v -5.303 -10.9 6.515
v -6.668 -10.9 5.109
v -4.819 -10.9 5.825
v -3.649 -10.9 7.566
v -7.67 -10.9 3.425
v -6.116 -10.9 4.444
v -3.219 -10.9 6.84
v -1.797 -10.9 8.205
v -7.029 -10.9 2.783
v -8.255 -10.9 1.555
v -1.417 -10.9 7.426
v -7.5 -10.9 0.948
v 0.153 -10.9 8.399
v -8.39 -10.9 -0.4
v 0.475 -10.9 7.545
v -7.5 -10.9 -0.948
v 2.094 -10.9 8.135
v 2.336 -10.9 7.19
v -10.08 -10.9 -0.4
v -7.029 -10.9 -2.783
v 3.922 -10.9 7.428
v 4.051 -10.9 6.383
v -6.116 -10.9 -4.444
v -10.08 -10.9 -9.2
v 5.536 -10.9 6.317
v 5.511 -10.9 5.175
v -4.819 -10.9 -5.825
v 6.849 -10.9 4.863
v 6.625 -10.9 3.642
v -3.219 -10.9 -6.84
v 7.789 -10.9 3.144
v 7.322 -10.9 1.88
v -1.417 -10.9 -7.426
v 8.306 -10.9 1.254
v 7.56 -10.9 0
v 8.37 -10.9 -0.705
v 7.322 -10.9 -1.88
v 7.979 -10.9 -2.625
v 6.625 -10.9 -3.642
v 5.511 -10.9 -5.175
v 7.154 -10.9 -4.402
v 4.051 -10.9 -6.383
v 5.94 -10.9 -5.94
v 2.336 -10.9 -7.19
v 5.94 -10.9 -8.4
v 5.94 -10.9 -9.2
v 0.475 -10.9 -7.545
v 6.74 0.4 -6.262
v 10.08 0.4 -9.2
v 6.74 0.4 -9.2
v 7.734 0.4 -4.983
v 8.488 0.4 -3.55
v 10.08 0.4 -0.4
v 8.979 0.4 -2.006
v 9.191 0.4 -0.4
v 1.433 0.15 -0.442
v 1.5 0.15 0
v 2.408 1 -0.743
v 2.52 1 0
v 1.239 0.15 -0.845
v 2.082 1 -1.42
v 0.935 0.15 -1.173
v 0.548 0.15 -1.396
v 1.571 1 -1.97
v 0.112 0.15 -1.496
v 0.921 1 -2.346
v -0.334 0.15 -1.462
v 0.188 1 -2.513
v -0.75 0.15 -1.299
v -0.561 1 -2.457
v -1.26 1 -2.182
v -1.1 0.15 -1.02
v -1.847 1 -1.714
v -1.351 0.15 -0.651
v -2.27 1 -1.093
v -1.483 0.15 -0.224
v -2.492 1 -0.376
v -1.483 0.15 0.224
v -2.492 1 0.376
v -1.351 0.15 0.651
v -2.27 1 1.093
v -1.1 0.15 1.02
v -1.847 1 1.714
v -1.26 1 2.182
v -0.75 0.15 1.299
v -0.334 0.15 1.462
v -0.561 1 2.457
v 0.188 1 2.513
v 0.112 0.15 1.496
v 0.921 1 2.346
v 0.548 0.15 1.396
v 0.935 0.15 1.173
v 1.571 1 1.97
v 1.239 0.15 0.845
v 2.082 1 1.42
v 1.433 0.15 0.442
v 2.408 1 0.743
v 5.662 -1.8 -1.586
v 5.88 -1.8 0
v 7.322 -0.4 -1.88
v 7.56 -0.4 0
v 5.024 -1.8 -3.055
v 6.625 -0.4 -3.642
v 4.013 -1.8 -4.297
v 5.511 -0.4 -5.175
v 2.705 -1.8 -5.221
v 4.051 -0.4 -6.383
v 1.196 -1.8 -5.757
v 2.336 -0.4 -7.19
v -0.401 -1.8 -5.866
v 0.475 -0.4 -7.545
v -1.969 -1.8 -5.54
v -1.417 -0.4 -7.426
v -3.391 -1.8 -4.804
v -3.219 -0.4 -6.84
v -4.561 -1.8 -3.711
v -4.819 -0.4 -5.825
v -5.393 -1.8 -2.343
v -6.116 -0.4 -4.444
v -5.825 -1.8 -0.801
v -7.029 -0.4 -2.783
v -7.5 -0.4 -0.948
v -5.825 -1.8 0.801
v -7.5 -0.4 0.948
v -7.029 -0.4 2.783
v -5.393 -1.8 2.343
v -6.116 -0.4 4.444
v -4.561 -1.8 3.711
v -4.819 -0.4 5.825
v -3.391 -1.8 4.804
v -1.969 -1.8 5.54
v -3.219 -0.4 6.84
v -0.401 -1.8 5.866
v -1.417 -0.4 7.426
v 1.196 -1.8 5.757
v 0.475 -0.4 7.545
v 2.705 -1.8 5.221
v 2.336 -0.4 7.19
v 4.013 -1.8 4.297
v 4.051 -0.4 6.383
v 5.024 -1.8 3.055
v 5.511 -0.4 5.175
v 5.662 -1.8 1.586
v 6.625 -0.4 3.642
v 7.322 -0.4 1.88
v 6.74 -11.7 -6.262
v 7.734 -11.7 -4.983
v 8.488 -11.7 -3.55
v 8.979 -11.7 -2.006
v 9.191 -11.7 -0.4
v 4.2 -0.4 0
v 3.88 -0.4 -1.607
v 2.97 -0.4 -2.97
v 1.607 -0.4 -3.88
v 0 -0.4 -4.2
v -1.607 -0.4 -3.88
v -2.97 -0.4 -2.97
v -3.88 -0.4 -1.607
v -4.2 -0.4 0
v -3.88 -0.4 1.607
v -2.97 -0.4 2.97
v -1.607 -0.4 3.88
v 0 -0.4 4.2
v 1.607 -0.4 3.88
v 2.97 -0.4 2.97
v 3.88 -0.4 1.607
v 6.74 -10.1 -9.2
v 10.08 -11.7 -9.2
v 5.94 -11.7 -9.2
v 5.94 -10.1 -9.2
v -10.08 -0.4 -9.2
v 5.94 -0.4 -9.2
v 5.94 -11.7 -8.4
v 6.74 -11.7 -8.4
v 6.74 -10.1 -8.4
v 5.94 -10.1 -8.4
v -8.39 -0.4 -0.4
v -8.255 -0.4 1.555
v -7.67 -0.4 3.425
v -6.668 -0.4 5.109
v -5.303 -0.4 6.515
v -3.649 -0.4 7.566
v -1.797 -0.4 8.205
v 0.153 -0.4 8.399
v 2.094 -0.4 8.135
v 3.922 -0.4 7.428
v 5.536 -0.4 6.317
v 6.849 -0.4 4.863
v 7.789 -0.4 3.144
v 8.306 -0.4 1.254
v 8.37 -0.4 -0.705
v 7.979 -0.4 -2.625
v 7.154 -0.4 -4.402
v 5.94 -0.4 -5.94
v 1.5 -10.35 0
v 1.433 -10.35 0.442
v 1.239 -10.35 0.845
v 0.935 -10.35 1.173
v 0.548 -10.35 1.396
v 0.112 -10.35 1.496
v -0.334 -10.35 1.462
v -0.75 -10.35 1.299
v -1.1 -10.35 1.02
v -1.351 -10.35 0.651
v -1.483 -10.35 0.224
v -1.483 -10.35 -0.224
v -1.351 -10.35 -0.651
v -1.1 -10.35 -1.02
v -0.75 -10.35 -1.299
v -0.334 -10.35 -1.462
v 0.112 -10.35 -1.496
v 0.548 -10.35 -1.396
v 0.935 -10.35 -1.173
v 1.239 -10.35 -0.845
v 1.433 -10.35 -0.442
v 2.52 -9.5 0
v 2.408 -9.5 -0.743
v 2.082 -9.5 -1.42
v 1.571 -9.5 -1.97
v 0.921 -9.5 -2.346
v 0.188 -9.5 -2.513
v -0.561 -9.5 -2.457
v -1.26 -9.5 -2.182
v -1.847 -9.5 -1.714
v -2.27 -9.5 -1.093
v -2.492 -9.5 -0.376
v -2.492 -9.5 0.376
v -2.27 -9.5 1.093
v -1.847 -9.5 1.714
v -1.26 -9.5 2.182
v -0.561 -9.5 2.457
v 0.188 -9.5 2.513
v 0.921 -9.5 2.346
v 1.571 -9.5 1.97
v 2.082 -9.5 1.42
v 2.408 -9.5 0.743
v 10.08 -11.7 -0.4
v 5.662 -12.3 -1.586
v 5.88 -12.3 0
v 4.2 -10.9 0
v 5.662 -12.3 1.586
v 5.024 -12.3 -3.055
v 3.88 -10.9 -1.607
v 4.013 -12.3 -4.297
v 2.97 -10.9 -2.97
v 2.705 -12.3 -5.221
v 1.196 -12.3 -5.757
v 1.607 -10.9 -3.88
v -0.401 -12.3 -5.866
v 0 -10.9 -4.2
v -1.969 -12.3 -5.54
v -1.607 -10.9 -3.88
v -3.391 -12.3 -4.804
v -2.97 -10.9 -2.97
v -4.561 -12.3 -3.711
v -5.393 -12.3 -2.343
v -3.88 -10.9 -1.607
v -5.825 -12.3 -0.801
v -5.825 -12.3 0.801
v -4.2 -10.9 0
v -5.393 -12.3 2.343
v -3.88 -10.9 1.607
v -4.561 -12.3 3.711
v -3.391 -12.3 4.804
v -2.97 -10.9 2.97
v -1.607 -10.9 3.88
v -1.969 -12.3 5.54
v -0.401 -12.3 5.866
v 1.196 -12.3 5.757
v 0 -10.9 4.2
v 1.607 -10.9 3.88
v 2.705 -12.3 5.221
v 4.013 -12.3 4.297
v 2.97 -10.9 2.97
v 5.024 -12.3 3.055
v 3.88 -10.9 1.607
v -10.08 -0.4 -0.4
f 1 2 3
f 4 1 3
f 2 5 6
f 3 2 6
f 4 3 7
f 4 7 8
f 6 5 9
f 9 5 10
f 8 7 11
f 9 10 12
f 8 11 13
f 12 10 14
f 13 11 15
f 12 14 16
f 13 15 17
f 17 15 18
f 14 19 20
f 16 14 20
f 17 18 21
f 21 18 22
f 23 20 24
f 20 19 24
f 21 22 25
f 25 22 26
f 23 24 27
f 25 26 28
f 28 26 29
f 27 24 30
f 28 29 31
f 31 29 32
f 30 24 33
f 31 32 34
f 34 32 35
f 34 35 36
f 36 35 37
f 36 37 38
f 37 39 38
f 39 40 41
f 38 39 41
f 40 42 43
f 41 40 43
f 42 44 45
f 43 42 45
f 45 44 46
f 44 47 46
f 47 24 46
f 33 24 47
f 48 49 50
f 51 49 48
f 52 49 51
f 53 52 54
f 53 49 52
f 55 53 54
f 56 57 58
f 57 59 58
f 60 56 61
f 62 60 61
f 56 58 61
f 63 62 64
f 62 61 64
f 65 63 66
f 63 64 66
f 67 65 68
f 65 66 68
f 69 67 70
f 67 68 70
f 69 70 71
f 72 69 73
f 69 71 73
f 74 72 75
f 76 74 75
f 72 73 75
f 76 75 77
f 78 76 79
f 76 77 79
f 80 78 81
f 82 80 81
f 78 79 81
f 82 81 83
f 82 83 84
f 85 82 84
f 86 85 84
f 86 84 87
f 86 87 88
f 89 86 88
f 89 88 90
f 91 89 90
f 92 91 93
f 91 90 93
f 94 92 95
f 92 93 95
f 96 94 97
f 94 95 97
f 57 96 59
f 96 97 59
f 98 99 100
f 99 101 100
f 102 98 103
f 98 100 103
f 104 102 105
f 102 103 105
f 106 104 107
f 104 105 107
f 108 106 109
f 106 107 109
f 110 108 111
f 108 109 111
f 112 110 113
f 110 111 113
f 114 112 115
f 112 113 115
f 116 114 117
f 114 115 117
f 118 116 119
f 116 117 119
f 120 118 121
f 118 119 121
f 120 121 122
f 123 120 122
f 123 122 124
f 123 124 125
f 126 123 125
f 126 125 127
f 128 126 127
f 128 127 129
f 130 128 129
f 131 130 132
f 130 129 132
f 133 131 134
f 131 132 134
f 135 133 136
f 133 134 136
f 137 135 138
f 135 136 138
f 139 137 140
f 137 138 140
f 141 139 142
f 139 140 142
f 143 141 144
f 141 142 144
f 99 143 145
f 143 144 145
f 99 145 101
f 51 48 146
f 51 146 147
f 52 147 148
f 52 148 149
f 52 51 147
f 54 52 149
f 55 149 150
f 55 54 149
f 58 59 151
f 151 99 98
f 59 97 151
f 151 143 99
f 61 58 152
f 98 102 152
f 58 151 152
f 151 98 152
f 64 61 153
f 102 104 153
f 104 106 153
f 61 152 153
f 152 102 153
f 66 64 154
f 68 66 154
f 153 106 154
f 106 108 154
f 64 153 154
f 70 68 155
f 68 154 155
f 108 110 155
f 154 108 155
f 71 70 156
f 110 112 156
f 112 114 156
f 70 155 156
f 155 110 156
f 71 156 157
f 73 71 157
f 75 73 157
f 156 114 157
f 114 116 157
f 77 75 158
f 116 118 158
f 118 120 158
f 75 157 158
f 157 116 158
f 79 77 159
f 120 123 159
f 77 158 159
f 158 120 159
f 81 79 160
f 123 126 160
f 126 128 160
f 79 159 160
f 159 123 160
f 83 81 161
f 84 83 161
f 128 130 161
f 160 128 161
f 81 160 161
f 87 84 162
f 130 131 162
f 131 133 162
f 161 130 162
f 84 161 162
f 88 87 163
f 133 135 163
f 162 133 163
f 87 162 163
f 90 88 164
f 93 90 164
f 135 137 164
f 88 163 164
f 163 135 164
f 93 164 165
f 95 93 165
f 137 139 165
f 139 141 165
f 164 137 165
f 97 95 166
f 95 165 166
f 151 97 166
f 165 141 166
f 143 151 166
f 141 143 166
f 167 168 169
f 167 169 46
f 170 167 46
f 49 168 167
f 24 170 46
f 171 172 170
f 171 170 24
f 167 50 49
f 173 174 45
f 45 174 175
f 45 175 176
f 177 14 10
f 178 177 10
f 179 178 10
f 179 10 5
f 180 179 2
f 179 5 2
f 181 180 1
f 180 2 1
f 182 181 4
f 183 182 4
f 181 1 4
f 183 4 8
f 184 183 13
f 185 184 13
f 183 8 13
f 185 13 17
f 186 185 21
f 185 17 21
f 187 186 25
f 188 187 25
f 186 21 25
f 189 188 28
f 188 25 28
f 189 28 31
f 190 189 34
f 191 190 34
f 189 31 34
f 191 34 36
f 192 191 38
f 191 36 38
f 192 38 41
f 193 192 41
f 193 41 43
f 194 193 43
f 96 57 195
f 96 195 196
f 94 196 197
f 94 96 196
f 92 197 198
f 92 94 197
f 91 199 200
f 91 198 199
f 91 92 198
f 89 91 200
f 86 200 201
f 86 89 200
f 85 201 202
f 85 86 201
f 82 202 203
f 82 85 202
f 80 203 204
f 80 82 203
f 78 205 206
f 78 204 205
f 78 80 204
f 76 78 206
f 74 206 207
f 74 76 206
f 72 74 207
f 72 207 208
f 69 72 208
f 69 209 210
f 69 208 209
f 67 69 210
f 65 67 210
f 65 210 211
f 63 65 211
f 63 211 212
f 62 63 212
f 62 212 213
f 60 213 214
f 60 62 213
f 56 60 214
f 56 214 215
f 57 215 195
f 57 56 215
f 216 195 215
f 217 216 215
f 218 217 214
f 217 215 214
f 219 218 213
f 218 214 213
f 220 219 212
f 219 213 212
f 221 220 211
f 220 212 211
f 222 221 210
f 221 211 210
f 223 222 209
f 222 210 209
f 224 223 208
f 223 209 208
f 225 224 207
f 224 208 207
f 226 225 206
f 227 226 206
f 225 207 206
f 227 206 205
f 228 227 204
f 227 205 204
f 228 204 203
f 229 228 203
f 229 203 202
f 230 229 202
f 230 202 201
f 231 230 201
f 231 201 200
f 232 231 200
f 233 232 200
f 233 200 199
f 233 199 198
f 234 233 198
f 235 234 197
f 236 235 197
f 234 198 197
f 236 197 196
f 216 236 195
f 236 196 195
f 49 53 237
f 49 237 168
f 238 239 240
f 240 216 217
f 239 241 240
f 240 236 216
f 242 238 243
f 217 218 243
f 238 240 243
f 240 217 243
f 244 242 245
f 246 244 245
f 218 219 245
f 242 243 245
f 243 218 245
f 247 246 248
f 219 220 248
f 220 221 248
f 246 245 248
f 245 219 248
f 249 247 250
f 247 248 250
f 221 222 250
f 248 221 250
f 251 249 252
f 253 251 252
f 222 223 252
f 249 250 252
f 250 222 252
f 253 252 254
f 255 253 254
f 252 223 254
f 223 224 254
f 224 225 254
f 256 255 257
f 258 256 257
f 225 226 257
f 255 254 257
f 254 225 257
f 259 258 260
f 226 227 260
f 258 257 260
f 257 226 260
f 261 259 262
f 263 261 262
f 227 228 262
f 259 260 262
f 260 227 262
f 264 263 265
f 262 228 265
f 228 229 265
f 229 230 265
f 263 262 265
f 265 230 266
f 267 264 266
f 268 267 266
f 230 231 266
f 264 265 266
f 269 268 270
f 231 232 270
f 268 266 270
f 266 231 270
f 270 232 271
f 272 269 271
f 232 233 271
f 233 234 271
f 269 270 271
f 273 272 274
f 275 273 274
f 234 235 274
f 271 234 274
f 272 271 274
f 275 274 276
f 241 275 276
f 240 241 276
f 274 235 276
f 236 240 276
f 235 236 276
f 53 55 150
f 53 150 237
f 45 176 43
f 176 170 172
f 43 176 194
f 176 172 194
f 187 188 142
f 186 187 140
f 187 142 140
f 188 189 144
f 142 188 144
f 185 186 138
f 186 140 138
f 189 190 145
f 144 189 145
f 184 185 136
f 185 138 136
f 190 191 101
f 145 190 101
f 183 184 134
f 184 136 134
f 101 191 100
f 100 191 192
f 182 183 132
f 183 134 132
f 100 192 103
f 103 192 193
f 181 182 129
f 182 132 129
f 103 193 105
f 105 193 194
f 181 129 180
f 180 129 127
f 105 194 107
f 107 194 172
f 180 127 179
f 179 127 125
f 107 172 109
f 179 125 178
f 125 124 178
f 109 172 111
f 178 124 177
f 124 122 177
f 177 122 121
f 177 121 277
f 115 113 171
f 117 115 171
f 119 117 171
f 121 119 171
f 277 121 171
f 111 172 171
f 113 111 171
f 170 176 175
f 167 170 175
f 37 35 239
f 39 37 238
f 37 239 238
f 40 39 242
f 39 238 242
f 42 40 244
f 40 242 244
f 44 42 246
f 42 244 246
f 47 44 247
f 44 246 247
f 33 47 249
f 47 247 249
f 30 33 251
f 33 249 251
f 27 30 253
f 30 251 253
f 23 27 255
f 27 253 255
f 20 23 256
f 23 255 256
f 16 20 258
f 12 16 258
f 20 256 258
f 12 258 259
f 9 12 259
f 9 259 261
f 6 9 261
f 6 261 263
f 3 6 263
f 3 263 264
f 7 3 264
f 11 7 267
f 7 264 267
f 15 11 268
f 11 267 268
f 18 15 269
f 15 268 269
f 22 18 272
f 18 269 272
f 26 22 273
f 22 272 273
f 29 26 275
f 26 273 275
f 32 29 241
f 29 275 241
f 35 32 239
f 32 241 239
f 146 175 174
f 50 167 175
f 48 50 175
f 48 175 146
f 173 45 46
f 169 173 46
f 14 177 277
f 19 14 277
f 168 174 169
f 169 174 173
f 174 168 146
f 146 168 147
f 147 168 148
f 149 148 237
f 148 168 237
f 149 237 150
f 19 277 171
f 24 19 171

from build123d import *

# Parameters (mm, degrees)
SKETCH014_R     = 1.5
POCKET002_DEPTH = 21
PAD010_DEPTH    = 10.5
PAD011_DEPTH    = 12.1
SKETCH046_W     = 0.8
SKETCH046_H     = 0.8
POCKET004_DEPTH = 10.5


with BuildPart() as part:
    # Sketch011 → Revolution004 (revolve)
    with BuildSketch(Plane.XY):
        Polygon((0, -0.4), (0.84, -0.4), (2.52, 1), (5.88, -1.8), (7.56, -0.4), (8.4, -0.4), (8.4, -10.9), (7.56, -10.9), (5.88, -12.3), (2.52, -9.5), (0.84, -10.9), (0, -10.9), align=None)
    revolve(axis=Axis((0, 0, 0), (0, 1, 0)))

    # Sketch014 → Pocket002 (cut)
    with BuildSketch(Plane.XZ.offset(-1)):
        Circle(SKETCH014_R)
    extrude(amount=POCKET002_DEPTH, mode=Mode.SUBTRACT)

    # Sketch025 → Pad010 (join)
    with BuildSketch(Plane.XZ.offset(0.4)):
        with BuildLine():
            Line((-10.08, -0.4), (-10.08, -9.2))
            Line((-10.08, -9.2), (5.939697, -9.2))
            Line((5.939697, -9.2), (5.939697, -5.939697))
            ThreePointArc((-8.390471, -0.4), (-3.028801, -7.834945), (5.939697, -5.939697))
            Line((-8.390471, -0.4), (-10.08, -0.4))
        make_face()
    extrude(amount=PAD010_DEPTH)

    # Sketch026 → Pad011 (join)
    with BuildSketch(Plane.XZ.offset(-0.4)):
        with BuildLine():
            ThreePointArc((6.739697, -6.262307), (8.487687, -3.549531), (9.1913, -0.4))
            Line((9.1913, -0.4), (10.08, -0.4))
            Line((10.08, -0.4), (10.08, -9.2))
            Line((10.08, -9.2), (5.939697, -9.2))
            Line((5.939697, -8.4), (5.939697, -9.2))
            Line((6.739697, -8.4), (5.939697, -8.4))
            Line((6.739697, -8.4), (6.739697, -6.262307))
        make_face()
    extrude(amount=PAD011_DEPTH)

    # Sketch046 → Pocket004 (cut)
    with BuildSketch(Plane.XZ.offset(-0.4)):
        with Locations((6.339697, -8.8)):
            Rectangle(SKETCH046_W, SKETCH046_H)
    extrude(amount=POCKET004_DEPTH, mode=Mode.SUBTRACT)


solid = part.part
